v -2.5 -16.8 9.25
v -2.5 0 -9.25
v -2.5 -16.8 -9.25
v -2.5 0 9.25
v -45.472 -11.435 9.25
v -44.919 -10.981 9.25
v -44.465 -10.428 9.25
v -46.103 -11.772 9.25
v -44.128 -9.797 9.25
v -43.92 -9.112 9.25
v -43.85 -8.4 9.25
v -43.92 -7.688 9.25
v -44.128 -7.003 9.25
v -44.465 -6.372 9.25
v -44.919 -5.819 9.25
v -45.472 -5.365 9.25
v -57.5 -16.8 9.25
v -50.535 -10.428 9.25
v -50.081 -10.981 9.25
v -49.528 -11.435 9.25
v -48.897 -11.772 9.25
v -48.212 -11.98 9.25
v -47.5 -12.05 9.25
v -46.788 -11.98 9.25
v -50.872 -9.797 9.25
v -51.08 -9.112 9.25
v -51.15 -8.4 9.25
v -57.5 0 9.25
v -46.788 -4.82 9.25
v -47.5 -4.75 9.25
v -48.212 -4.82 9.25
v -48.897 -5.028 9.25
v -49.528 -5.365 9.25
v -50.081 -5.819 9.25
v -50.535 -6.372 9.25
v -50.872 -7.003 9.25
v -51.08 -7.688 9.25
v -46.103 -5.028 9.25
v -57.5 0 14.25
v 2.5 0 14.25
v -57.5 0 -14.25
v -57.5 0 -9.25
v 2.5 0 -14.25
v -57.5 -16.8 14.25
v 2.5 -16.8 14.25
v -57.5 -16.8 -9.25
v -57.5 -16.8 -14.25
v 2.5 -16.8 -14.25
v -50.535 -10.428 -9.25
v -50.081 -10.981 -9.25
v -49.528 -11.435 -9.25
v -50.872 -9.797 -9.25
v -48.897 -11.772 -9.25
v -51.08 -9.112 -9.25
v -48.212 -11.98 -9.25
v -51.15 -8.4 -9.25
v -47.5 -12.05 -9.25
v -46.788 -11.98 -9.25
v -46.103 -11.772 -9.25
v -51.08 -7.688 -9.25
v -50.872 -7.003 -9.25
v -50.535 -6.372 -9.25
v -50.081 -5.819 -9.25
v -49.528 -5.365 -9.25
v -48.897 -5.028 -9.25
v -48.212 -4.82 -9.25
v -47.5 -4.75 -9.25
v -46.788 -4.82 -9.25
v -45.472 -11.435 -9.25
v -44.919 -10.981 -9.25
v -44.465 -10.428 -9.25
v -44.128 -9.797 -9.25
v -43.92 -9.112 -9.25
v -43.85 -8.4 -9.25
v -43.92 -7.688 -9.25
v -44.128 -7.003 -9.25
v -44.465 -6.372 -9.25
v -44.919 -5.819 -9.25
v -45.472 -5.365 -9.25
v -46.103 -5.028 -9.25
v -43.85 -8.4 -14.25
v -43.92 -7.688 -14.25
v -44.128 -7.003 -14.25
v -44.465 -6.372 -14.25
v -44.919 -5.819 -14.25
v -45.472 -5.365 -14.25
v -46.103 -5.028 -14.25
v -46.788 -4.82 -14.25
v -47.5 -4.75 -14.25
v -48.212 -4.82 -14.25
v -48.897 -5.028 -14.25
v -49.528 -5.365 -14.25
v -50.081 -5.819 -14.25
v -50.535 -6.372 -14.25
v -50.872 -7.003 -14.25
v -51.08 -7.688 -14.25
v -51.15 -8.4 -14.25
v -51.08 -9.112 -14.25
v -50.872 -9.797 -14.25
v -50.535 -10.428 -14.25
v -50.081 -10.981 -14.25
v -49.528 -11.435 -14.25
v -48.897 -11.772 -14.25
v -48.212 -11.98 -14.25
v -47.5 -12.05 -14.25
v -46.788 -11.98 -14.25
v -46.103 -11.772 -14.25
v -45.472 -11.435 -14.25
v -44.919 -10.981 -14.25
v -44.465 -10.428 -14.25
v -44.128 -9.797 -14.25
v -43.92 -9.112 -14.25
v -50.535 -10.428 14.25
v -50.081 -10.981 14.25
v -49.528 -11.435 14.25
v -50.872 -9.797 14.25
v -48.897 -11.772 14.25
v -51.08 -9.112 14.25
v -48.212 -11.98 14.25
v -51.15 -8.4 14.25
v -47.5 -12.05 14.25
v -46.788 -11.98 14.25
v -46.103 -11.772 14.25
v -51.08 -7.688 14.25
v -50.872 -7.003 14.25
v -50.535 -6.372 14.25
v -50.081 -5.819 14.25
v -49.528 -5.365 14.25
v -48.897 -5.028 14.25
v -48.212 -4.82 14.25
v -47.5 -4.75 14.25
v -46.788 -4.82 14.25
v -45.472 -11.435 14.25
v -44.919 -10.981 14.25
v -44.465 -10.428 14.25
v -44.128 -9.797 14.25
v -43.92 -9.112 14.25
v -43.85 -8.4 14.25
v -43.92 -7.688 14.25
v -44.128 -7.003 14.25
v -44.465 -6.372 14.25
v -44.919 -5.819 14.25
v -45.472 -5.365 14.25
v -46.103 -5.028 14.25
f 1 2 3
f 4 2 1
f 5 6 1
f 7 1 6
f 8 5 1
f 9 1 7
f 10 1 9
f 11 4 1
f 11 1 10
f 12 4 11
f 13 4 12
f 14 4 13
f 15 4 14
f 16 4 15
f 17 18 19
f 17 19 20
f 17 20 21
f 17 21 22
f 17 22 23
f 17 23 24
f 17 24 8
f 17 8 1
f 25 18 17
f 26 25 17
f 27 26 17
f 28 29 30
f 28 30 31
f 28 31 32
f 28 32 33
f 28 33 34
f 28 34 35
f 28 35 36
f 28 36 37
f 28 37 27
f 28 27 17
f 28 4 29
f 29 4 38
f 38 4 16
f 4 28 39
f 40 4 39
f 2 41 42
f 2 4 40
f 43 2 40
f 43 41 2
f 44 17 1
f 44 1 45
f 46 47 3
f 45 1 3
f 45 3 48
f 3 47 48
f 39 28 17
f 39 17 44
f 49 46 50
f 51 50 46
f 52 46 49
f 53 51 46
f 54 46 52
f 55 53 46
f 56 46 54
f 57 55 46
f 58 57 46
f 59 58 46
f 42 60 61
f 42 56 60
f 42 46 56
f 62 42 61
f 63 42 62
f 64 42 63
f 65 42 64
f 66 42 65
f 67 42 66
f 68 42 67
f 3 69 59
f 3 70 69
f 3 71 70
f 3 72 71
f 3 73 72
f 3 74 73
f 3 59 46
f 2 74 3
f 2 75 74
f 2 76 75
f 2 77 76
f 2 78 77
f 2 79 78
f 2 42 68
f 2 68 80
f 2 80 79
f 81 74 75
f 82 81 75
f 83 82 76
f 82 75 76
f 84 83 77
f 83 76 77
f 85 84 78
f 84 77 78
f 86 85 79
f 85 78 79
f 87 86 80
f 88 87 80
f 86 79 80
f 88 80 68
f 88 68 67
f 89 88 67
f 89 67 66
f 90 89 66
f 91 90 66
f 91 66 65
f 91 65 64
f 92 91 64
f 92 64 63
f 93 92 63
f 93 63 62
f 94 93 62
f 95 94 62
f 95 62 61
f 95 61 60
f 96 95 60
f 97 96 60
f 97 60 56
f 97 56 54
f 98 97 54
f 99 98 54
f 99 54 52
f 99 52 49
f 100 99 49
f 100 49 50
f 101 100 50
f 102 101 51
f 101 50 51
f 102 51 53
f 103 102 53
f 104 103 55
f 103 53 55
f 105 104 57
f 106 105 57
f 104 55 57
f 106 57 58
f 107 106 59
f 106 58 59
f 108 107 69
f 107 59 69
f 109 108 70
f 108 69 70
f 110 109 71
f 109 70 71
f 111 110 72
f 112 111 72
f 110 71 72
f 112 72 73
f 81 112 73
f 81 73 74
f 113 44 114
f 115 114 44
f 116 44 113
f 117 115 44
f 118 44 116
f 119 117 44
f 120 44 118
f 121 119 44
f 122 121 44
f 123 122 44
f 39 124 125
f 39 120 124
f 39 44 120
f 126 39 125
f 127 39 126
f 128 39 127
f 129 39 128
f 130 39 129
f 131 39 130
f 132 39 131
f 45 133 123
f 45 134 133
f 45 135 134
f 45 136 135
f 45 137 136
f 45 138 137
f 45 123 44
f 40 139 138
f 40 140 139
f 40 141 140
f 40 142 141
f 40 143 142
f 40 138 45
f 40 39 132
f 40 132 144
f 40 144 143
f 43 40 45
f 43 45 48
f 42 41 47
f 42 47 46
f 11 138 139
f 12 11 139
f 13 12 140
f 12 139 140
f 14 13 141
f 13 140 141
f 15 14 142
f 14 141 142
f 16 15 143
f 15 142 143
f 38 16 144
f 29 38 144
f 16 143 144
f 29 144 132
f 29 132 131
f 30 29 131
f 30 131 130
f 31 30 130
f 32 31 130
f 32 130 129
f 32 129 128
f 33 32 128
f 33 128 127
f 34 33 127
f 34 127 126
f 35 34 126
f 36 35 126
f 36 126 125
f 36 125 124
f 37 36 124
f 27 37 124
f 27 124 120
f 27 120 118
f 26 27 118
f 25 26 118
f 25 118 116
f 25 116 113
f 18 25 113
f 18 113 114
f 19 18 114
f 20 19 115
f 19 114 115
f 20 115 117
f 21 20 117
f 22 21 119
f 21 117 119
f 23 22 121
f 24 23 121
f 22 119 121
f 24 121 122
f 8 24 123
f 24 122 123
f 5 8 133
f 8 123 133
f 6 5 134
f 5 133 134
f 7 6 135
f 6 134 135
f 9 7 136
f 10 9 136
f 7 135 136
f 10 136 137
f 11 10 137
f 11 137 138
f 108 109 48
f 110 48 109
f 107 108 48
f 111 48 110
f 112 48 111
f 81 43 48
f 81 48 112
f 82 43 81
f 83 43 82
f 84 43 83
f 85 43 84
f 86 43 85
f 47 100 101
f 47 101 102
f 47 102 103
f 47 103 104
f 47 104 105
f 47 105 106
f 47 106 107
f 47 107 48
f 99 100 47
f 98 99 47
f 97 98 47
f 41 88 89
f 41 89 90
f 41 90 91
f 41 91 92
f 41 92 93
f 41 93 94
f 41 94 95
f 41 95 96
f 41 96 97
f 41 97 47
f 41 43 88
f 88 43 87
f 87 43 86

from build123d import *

# Parameters (mm, degrees)
BOSS_EXTRUDE2_DEPTH = 16.8
SKETCH5_R           = 3.65
CUT_EXTRUDE3_DEPTH  = 28.5


with BuildPart() as part:
    # Sketch1 → Boss-Extrude2 (new body)
    with BuildSketch(Plane(origin=(0, 0, 0), x_dir=(1, 0, 0), z_dir=(0, 1, 0))):
        Polygon((2.5, -9.25), (-2.5, -9.25), (-57.5, -9.25), (-57.5, -14.25), (2.5, -14.25), align=None)
        Polygon((2.5, 9.25), (-2.5, 9.25), (-2.5, 4.25), (-2.5, -9.25), (2.5, -9.25), align=None)
        Polygon((-57.5, 9.25), (-2.5, 9.25), (2.5, 9.25), (2.5, 14.25), (-57.5, 14.25), align=None)
    extrude(amount=-BOSS_EXTRUDE2_DEPTH)

    # Sketch5 → Cut-Extrude3 (cut)
    with BuildSketch(Plane.XY.offset(14.25)):
        with Locations((-47.5, -8.4)):
            Circle(SKETCH5_R)
    extrude(amount=-CUT_EXTRUDE3_DEPTH, mode=Mode.SUBTRACT)


solid = part.part
